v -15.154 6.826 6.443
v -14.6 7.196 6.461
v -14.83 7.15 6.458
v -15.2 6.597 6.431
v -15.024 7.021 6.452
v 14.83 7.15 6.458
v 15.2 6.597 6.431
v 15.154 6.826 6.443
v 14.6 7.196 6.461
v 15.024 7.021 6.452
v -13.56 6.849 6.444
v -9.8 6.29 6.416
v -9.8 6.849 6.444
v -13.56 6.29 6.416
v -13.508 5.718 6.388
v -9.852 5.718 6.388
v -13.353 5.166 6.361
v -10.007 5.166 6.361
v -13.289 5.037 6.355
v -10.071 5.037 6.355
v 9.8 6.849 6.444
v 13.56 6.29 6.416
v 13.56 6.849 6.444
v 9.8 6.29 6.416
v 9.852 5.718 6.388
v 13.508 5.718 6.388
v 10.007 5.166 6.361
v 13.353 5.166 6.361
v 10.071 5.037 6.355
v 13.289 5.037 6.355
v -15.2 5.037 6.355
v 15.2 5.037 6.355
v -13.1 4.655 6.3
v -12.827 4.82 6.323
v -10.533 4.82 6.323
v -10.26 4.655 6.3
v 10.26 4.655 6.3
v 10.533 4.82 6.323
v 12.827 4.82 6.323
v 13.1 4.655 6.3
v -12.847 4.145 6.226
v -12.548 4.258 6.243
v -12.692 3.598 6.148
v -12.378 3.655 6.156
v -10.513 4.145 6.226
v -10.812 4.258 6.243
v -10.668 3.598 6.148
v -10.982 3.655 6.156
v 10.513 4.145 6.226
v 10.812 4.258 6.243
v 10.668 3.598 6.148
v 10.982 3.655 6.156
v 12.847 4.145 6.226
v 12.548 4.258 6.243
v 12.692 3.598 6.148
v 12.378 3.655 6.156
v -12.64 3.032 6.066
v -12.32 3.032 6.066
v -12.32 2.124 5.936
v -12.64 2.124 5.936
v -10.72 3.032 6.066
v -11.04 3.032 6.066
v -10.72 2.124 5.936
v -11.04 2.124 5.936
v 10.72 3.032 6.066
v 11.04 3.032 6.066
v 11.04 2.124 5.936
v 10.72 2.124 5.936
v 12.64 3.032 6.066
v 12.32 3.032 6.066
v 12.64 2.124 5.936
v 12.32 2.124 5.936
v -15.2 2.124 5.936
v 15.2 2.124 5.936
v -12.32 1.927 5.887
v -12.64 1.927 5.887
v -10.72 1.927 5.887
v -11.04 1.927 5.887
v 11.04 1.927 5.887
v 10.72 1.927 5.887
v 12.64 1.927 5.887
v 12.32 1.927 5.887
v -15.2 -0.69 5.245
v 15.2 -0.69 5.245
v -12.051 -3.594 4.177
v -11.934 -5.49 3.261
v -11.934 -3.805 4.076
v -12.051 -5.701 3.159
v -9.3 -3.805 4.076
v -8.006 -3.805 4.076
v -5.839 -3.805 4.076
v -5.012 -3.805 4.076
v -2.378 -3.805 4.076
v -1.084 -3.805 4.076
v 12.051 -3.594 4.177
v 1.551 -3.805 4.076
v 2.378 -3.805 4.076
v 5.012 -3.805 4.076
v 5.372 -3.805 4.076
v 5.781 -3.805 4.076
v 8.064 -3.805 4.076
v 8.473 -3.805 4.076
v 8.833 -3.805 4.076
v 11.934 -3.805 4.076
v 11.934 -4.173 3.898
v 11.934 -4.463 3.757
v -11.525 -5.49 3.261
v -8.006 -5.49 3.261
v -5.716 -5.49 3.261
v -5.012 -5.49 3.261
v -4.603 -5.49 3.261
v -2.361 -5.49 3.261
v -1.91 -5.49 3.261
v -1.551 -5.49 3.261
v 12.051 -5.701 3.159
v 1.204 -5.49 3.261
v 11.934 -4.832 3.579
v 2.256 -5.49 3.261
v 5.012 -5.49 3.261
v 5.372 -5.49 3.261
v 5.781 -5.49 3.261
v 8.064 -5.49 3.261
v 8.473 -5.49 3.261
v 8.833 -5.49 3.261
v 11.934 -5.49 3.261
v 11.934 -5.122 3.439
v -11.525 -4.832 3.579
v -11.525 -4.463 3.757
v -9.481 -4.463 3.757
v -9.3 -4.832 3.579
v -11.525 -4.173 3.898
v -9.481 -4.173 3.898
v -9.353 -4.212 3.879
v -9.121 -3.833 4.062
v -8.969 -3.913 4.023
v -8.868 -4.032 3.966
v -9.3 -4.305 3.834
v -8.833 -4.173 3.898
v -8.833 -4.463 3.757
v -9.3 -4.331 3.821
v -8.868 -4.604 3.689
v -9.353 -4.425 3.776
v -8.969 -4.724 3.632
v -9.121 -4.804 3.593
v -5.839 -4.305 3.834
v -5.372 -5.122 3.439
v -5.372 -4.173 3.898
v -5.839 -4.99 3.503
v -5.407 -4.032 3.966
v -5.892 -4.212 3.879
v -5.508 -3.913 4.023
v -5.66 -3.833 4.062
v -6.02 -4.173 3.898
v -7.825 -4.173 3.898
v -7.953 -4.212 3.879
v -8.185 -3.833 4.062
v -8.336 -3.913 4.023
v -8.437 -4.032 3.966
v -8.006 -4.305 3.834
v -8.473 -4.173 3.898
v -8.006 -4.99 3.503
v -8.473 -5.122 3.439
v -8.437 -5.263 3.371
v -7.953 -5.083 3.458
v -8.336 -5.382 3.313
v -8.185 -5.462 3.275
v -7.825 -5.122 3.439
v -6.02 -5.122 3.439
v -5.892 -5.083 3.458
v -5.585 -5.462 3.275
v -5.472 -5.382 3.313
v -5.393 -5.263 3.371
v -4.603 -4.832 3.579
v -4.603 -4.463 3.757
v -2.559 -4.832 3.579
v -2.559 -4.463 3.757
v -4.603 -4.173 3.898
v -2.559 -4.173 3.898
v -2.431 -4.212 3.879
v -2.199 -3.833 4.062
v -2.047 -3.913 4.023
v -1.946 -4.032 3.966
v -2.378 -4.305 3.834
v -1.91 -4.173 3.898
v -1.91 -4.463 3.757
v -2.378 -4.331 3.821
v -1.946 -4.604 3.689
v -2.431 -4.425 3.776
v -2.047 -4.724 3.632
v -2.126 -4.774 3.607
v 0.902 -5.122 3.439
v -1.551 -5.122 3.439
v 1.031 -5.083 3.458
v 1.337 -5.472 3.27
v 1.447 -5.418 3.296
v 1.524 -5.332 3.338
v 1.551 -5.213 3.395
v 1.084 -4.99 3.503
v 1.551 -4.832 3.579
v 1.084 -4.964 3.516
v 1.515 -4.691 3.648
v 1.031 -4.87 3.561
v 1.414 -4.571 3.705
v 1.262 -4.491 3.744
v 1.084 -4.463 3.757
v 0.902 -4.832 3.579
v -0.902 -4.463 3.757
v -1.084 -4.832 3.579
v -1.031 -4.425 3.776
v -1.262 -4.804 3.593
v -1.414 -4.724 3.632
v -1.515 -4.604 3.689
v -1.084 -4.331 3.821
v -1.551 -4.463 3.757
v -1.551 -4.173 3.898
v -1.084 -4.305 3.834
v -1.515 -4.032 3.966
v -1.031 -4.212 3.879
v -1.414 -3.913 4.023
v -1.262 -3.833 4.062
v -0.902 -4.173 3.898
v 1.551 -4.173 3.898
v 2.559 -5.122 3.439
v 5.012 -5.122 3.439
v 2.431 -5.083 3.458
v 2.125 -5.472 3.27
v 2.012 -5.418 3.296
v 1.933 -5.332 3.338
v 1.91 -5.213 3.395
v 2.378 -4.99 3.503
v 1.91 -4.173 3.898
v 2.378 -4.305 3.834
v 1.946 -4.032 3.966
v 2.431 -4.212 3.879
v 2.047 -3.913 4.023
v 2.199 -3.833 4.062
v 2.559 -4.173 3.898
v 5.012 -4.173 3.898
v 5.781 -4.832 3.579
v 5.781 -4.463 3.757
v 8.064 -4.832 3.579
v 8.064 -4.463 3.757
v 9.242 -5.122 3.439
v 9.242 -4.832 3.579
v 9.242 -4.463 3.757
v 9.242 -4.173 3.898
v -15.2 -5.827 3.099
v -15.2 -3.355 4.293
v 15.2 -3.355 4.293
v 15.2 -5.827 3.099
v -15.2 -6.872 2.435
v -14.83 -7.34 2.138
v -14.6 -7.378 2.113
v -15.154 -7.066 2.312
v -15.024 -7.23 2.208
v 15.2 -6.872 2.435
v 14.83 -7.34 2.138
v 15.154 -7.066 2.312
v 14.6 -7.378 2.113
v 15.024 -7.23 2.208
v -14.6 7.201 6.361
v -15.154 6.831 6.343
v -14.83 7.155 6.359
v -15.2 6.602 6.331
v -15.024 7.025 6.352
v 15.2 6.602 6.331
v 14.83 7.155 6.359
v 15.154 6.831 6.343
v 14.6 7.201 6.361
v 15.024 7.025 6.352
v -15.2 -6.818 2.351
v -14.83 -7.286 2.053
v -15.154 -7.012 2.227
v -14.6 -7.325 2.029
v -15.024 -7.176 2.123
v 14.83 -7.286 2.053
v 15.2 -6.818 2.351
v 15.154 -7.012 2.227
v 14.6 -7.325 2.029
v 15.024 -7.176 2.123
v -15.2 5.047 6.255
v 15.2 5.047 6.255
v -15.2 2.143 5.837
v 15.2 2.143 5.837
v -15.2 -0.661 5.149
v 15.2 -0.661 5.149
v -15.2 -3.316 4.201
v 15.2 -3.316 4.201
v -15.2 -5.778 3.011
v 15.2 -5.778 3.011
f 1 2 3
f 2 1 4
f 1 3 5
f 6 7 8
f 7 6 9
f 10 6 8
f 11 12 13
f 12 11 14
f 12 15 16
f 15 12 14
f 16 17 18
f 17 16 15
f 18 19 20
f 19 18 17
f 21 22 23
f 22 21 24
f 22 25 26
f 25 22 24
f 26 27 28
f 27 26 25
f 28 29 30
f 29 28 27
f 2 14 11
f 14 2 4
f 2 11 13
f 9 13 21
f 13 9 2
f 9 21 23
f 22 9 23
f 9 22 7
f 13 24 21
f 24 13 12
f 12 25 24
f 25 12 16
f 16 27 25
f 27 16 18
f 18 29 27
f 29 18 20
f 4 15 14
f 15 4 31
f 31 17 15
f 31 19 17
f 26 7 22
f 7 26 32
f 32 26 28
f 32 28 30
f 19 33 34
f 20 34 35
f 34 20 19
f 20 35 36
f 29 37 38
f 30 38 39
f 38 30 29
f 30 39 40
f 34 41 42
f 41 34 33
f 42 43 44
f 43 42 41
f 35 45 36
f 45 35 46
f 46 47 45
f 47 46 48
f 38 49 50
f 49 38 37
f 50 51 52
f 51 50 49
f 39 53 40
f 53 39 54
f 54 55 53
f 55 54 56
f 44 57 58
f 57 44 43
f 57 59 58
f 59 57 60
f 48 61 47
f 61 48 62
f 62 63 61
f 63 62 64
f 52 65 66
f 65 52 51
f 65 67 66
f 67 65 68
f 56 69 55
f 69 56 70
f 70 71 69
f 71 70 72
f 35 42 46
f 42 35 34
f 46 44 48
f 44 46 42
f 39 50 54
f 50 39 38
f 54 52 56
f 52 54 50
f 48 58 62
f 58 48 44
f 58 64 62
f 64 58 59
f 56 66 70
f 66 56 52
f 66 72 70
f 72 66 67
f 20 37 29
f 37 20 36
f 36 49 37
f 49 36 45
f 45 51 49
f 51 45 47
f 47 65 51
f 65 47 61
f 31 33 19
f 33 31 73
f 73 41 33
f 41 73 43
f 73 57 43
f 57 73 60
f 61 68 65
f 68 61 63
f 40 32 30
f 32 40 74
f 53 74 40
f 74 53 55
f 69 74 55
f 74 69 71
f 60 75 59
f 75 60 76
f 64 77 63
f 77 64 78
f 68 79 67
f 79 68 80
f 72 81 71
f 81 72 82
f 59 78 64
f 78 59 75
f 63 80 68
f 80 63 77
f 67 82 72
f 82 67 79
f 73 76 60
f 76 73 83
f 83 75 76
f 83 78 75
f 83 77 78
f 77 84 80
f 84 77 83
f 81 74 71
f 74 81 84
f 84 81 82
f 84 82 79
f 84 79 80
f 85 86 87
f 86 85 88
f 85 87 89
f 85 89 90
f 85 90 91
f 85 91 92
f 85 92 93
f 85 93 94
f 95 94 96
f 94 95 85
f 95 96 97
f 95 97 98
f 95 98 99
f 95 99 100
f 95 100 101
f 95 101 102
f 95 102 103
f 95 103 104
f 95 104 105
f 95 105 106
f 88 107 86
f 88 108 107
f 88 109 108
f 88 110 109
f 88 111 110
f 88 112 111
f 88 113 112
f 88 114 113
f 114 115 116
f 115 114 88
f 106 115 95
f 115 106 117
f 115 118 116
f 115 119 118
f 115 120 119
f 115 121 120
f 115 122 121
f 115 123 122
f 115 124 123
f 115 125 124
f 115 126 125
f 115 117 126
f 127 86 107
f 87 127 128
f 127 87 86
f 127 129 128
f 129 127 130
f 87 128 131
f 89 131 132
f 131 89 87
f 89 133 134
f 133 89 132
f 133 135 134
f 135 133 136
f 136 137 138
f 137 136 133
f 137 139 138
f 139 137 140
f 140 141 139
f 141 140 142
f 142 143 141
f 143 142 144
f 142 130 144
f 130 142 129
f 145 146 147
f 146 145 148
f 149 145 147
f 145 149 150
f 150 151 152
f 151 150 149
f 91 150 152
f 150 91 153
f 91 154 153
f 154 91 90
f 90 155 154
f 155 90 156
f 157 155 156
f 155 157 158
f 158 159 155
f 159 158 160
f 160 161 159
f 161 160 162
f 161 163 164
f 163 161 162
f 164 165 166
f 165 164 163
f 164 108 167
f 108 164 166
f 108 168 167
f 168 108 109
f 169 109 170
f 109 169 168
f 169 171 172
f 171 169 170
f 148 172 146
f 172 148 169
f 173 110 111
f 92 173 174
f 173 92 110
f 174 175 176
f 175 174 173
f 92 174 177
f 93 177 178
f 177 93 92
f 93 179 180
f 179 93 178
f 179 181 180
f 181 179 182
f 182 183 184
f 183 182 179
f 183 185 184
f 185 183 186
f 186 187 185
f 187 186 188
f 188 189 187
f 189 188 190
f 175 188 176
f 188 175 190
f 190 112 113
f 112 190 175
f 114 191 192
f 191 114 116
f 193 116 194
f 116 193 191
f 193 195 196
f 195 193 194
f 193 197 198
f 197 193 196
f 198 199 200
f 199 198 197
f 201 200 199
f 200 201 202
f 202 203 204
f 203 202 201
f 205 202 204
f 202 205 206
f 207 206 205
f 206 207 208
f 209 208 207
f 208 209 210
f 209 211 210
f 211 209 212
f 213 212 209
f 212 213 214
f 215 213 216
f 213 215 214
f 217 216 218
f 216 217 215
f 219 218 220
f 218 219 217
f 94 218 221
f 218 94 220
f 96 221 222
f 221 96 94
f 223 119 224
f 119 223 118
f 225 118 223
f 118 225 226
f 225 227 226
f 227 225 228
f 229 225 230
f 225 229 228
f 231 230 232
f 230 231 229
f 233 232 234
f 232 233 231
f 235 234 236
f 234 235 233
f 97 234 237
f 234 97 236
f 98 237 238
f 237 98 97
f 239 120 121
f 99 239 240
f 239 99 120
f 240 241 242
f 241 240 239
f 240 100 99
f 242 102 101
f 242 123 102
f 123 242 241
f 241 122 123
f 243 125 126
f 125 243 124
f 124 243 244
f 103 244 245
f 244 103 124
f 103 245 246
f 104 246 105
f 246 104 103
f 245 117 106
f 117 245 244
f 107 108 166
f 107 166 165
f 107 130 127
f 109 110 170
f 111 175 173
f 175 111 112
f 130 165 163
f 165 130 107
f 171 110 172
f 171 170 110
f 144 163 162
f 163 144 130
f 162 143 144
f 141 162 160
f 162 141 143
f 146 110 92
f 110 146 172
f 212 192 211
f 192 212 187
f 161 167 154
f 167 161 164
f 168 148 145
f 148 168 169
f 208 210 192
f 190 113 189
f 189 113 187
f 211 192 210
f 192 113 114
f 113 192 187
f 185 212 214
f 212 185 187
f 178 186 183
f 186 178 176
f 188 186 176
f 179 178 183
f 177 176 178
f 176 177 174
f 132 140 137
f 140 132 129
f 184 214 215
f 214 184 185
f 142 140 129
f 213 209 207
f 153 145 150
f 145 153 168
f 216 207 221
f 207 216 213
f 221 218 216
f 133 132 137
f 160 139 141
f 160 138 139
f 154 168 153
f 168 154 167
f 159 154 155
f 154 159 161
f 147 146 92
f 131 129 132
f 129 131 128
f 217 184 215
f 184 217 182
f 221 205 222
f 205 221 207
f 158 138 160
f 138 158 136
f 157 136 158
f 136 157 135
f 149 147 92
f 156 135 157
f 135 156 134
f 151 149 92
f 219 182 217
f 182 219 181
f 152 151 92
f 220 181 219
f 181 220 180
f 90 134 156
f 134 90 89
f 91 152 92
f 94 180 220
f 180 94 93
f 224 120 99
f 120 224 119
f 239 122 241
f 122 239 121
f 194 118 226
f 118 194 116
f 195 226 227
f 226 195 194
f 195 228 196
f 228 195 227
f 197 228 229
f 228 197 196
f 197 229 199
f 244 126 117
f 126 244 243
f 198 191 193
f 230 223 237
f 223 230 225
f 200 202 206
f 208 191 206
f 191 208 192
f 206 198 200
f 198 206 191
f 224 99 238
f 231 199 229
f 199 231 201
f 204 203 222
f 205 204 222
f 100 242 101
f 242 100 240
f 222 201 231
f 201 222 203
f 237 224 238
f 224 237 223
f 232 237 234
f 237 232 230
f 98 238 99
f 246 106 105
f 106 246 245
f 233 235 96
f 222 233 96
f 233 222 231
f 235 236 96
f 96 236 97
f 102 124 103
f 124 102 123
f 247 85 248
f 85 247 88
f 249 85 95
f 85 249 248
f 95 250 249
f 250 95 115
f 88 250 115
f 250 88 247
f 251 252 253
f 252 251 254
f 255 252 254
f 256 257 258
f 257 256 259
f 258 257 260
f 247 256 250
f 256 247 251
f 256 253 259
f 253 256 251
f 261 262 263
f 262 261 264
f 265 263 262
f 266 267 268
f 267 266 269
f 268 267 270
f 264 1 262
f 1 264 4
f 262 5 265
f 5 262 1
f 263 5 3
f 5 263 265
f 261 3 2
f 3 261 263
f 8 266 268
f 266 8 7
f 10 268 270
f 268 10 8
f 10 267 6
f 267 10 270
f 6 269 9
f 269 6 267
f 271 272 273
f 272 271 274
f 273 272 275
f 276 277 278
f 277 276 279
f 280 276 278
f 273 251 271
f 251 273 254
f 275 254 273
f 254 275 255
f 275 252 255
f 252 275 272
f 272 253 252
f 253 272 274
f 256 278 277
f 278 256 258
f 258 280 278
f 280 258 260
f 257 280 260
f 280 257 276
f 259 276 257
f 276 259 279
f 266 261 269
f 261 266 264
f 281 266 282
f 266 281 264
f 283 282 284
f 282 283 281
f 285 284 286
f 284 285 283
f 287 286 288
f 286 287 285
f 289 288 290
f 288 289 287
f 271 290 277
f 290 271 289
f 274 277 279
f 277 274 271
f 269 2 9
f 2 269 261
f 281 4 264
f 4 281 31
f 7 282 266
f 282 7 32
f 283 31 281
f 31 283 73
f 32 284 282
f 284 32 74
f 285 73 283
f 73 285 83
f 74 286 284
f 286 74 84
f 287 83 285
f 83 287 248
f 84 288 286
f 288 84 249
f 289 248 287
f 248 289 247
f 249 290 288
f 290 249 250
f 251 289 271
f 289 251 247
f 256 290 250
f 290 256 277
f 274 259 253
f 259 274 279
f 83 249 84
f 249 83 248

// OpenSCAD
use <../lib.scad>
use <s/6148328ys01.scad>
use <s/6148328ys02.scad>
use <s/6148328ys03.scad>
use <s/6148328ys04.scad>
use <s/6148328ys05.scad>
use <s/6148328ys07.scad>
function ldraw_lib__6148328yc01() = [
// 0 Sticker  1.9 x  3.8 with Black Air Vents and White "PORSCHE" on Red Background (Formed) (Needs work)
// 0 Name: 6148328yc01.dat
// 0 Author: Massimo Maso [Sirio]
// 0 !LDRAW_ORG Part UPDATE 2023-05
// 0 !LICENSE Licensed under CC BY 4.0 : see CAreadme.txt
// 
// 0 !HELP Needs work: halftone areas in the air vents are simplified with dark red faces
// 
// 0 BFC CERTIFY CCW
  [0,"BFC","CERTIFY"],
  [0,"BFC","CCW"],
// 
// 0 !KEYWORDS 917K, Bricklink 75876stk01, Brickowl 852010, Pit Lane
// 0 !KEYWORDS Rebrickable 26357, set 75876, Speed Champions
// 
// 0 !HISTORY 2023-10-31 [OrionP] Official Update 2023-05
// 
// 
// 1 16 0 -15.6377 12.6163 1 0 0 0 .998798 -.049008 0 .049008 .998798 s\6148328ys01.dat
  [1,16,0,-15.6377,12.6163,1,0,0,0,.998798,-.049008,0,.049008,.998798, ldraw_lib__s__6148328ys01()],
// 1 16 0 -15.6377 12.6163 1 0 0 0 .989808 -.142406 0 .142406 .989808 s\6148328ys02.dat
  [1,16,0,-15.6377,12.6163,1,0,0,0,.989808,-.142406,0,.142406,.989808, ldraw_lib__s__6148328ys02()],
// 1 16 0 -12.8729 -1.6532 1 0 0 0 .971182 -.238339 0 .238339 .971182 s\6148328ys03.dat
  [1,16,0,-12.8729,-1.6532,1,0,0,0,.971182,-.238339,0,.238339,.971182, ldraw_lib__s__6148328ys03()],
// 1 16 0 -7.5277 -14.4459 1 0 0 0 .900443 -.434973 0 .434973 .900443 s\6148328ys04.dat
  [1,16,0,-7.5277,-14.4459,1,0,0,0,.900443,-.434973,0,.434973,.900443, ldraw_lib__s__6148328ys04()],
// 1 16 0 -7.5277 -14.4459 1 0 0 0 .844124 -.536148 0 .536148 .844124 s\6148328ys05.dat
  [1,16,0,-7.5277,-14.4459,1,0,0,0,.844124,-.536148,0,.536148,.844124, ldraw_lib__s__6148328ys05()],
// 1 16 0 0 0 1 0 0 0 1 0 0 0 1 s\6148328ys07.dat
  [1,16,0,0,0,1,0,0,0,1,0,0,0,1, ldraw_lib__s__6148328ys07()],
// 0 // Face
// 4 4 -38 -13.1126 -1.7252 -38 -10.7323 -8.3867 38 -10.7323 -8.3867 38 -13.1126 -1.7252
  [4,4,-38,-13.1126,-1.7252,-38,-10.7323,-8.3867,38,-10.7323,-8.3867,38,-13.1126,-1.7252],
];
module ldraw_lib__6148328yc01(step=0, col=false, unit=2/5, alt=false, line=0.2, solid=!$preview)
    makepoly(ldraw_lib__6148328yc01(), step=step, col=col, unit=unit, alt=alt, line=line, solid=solid);
ldraw_lib__6148328yc01(line=0.2);
